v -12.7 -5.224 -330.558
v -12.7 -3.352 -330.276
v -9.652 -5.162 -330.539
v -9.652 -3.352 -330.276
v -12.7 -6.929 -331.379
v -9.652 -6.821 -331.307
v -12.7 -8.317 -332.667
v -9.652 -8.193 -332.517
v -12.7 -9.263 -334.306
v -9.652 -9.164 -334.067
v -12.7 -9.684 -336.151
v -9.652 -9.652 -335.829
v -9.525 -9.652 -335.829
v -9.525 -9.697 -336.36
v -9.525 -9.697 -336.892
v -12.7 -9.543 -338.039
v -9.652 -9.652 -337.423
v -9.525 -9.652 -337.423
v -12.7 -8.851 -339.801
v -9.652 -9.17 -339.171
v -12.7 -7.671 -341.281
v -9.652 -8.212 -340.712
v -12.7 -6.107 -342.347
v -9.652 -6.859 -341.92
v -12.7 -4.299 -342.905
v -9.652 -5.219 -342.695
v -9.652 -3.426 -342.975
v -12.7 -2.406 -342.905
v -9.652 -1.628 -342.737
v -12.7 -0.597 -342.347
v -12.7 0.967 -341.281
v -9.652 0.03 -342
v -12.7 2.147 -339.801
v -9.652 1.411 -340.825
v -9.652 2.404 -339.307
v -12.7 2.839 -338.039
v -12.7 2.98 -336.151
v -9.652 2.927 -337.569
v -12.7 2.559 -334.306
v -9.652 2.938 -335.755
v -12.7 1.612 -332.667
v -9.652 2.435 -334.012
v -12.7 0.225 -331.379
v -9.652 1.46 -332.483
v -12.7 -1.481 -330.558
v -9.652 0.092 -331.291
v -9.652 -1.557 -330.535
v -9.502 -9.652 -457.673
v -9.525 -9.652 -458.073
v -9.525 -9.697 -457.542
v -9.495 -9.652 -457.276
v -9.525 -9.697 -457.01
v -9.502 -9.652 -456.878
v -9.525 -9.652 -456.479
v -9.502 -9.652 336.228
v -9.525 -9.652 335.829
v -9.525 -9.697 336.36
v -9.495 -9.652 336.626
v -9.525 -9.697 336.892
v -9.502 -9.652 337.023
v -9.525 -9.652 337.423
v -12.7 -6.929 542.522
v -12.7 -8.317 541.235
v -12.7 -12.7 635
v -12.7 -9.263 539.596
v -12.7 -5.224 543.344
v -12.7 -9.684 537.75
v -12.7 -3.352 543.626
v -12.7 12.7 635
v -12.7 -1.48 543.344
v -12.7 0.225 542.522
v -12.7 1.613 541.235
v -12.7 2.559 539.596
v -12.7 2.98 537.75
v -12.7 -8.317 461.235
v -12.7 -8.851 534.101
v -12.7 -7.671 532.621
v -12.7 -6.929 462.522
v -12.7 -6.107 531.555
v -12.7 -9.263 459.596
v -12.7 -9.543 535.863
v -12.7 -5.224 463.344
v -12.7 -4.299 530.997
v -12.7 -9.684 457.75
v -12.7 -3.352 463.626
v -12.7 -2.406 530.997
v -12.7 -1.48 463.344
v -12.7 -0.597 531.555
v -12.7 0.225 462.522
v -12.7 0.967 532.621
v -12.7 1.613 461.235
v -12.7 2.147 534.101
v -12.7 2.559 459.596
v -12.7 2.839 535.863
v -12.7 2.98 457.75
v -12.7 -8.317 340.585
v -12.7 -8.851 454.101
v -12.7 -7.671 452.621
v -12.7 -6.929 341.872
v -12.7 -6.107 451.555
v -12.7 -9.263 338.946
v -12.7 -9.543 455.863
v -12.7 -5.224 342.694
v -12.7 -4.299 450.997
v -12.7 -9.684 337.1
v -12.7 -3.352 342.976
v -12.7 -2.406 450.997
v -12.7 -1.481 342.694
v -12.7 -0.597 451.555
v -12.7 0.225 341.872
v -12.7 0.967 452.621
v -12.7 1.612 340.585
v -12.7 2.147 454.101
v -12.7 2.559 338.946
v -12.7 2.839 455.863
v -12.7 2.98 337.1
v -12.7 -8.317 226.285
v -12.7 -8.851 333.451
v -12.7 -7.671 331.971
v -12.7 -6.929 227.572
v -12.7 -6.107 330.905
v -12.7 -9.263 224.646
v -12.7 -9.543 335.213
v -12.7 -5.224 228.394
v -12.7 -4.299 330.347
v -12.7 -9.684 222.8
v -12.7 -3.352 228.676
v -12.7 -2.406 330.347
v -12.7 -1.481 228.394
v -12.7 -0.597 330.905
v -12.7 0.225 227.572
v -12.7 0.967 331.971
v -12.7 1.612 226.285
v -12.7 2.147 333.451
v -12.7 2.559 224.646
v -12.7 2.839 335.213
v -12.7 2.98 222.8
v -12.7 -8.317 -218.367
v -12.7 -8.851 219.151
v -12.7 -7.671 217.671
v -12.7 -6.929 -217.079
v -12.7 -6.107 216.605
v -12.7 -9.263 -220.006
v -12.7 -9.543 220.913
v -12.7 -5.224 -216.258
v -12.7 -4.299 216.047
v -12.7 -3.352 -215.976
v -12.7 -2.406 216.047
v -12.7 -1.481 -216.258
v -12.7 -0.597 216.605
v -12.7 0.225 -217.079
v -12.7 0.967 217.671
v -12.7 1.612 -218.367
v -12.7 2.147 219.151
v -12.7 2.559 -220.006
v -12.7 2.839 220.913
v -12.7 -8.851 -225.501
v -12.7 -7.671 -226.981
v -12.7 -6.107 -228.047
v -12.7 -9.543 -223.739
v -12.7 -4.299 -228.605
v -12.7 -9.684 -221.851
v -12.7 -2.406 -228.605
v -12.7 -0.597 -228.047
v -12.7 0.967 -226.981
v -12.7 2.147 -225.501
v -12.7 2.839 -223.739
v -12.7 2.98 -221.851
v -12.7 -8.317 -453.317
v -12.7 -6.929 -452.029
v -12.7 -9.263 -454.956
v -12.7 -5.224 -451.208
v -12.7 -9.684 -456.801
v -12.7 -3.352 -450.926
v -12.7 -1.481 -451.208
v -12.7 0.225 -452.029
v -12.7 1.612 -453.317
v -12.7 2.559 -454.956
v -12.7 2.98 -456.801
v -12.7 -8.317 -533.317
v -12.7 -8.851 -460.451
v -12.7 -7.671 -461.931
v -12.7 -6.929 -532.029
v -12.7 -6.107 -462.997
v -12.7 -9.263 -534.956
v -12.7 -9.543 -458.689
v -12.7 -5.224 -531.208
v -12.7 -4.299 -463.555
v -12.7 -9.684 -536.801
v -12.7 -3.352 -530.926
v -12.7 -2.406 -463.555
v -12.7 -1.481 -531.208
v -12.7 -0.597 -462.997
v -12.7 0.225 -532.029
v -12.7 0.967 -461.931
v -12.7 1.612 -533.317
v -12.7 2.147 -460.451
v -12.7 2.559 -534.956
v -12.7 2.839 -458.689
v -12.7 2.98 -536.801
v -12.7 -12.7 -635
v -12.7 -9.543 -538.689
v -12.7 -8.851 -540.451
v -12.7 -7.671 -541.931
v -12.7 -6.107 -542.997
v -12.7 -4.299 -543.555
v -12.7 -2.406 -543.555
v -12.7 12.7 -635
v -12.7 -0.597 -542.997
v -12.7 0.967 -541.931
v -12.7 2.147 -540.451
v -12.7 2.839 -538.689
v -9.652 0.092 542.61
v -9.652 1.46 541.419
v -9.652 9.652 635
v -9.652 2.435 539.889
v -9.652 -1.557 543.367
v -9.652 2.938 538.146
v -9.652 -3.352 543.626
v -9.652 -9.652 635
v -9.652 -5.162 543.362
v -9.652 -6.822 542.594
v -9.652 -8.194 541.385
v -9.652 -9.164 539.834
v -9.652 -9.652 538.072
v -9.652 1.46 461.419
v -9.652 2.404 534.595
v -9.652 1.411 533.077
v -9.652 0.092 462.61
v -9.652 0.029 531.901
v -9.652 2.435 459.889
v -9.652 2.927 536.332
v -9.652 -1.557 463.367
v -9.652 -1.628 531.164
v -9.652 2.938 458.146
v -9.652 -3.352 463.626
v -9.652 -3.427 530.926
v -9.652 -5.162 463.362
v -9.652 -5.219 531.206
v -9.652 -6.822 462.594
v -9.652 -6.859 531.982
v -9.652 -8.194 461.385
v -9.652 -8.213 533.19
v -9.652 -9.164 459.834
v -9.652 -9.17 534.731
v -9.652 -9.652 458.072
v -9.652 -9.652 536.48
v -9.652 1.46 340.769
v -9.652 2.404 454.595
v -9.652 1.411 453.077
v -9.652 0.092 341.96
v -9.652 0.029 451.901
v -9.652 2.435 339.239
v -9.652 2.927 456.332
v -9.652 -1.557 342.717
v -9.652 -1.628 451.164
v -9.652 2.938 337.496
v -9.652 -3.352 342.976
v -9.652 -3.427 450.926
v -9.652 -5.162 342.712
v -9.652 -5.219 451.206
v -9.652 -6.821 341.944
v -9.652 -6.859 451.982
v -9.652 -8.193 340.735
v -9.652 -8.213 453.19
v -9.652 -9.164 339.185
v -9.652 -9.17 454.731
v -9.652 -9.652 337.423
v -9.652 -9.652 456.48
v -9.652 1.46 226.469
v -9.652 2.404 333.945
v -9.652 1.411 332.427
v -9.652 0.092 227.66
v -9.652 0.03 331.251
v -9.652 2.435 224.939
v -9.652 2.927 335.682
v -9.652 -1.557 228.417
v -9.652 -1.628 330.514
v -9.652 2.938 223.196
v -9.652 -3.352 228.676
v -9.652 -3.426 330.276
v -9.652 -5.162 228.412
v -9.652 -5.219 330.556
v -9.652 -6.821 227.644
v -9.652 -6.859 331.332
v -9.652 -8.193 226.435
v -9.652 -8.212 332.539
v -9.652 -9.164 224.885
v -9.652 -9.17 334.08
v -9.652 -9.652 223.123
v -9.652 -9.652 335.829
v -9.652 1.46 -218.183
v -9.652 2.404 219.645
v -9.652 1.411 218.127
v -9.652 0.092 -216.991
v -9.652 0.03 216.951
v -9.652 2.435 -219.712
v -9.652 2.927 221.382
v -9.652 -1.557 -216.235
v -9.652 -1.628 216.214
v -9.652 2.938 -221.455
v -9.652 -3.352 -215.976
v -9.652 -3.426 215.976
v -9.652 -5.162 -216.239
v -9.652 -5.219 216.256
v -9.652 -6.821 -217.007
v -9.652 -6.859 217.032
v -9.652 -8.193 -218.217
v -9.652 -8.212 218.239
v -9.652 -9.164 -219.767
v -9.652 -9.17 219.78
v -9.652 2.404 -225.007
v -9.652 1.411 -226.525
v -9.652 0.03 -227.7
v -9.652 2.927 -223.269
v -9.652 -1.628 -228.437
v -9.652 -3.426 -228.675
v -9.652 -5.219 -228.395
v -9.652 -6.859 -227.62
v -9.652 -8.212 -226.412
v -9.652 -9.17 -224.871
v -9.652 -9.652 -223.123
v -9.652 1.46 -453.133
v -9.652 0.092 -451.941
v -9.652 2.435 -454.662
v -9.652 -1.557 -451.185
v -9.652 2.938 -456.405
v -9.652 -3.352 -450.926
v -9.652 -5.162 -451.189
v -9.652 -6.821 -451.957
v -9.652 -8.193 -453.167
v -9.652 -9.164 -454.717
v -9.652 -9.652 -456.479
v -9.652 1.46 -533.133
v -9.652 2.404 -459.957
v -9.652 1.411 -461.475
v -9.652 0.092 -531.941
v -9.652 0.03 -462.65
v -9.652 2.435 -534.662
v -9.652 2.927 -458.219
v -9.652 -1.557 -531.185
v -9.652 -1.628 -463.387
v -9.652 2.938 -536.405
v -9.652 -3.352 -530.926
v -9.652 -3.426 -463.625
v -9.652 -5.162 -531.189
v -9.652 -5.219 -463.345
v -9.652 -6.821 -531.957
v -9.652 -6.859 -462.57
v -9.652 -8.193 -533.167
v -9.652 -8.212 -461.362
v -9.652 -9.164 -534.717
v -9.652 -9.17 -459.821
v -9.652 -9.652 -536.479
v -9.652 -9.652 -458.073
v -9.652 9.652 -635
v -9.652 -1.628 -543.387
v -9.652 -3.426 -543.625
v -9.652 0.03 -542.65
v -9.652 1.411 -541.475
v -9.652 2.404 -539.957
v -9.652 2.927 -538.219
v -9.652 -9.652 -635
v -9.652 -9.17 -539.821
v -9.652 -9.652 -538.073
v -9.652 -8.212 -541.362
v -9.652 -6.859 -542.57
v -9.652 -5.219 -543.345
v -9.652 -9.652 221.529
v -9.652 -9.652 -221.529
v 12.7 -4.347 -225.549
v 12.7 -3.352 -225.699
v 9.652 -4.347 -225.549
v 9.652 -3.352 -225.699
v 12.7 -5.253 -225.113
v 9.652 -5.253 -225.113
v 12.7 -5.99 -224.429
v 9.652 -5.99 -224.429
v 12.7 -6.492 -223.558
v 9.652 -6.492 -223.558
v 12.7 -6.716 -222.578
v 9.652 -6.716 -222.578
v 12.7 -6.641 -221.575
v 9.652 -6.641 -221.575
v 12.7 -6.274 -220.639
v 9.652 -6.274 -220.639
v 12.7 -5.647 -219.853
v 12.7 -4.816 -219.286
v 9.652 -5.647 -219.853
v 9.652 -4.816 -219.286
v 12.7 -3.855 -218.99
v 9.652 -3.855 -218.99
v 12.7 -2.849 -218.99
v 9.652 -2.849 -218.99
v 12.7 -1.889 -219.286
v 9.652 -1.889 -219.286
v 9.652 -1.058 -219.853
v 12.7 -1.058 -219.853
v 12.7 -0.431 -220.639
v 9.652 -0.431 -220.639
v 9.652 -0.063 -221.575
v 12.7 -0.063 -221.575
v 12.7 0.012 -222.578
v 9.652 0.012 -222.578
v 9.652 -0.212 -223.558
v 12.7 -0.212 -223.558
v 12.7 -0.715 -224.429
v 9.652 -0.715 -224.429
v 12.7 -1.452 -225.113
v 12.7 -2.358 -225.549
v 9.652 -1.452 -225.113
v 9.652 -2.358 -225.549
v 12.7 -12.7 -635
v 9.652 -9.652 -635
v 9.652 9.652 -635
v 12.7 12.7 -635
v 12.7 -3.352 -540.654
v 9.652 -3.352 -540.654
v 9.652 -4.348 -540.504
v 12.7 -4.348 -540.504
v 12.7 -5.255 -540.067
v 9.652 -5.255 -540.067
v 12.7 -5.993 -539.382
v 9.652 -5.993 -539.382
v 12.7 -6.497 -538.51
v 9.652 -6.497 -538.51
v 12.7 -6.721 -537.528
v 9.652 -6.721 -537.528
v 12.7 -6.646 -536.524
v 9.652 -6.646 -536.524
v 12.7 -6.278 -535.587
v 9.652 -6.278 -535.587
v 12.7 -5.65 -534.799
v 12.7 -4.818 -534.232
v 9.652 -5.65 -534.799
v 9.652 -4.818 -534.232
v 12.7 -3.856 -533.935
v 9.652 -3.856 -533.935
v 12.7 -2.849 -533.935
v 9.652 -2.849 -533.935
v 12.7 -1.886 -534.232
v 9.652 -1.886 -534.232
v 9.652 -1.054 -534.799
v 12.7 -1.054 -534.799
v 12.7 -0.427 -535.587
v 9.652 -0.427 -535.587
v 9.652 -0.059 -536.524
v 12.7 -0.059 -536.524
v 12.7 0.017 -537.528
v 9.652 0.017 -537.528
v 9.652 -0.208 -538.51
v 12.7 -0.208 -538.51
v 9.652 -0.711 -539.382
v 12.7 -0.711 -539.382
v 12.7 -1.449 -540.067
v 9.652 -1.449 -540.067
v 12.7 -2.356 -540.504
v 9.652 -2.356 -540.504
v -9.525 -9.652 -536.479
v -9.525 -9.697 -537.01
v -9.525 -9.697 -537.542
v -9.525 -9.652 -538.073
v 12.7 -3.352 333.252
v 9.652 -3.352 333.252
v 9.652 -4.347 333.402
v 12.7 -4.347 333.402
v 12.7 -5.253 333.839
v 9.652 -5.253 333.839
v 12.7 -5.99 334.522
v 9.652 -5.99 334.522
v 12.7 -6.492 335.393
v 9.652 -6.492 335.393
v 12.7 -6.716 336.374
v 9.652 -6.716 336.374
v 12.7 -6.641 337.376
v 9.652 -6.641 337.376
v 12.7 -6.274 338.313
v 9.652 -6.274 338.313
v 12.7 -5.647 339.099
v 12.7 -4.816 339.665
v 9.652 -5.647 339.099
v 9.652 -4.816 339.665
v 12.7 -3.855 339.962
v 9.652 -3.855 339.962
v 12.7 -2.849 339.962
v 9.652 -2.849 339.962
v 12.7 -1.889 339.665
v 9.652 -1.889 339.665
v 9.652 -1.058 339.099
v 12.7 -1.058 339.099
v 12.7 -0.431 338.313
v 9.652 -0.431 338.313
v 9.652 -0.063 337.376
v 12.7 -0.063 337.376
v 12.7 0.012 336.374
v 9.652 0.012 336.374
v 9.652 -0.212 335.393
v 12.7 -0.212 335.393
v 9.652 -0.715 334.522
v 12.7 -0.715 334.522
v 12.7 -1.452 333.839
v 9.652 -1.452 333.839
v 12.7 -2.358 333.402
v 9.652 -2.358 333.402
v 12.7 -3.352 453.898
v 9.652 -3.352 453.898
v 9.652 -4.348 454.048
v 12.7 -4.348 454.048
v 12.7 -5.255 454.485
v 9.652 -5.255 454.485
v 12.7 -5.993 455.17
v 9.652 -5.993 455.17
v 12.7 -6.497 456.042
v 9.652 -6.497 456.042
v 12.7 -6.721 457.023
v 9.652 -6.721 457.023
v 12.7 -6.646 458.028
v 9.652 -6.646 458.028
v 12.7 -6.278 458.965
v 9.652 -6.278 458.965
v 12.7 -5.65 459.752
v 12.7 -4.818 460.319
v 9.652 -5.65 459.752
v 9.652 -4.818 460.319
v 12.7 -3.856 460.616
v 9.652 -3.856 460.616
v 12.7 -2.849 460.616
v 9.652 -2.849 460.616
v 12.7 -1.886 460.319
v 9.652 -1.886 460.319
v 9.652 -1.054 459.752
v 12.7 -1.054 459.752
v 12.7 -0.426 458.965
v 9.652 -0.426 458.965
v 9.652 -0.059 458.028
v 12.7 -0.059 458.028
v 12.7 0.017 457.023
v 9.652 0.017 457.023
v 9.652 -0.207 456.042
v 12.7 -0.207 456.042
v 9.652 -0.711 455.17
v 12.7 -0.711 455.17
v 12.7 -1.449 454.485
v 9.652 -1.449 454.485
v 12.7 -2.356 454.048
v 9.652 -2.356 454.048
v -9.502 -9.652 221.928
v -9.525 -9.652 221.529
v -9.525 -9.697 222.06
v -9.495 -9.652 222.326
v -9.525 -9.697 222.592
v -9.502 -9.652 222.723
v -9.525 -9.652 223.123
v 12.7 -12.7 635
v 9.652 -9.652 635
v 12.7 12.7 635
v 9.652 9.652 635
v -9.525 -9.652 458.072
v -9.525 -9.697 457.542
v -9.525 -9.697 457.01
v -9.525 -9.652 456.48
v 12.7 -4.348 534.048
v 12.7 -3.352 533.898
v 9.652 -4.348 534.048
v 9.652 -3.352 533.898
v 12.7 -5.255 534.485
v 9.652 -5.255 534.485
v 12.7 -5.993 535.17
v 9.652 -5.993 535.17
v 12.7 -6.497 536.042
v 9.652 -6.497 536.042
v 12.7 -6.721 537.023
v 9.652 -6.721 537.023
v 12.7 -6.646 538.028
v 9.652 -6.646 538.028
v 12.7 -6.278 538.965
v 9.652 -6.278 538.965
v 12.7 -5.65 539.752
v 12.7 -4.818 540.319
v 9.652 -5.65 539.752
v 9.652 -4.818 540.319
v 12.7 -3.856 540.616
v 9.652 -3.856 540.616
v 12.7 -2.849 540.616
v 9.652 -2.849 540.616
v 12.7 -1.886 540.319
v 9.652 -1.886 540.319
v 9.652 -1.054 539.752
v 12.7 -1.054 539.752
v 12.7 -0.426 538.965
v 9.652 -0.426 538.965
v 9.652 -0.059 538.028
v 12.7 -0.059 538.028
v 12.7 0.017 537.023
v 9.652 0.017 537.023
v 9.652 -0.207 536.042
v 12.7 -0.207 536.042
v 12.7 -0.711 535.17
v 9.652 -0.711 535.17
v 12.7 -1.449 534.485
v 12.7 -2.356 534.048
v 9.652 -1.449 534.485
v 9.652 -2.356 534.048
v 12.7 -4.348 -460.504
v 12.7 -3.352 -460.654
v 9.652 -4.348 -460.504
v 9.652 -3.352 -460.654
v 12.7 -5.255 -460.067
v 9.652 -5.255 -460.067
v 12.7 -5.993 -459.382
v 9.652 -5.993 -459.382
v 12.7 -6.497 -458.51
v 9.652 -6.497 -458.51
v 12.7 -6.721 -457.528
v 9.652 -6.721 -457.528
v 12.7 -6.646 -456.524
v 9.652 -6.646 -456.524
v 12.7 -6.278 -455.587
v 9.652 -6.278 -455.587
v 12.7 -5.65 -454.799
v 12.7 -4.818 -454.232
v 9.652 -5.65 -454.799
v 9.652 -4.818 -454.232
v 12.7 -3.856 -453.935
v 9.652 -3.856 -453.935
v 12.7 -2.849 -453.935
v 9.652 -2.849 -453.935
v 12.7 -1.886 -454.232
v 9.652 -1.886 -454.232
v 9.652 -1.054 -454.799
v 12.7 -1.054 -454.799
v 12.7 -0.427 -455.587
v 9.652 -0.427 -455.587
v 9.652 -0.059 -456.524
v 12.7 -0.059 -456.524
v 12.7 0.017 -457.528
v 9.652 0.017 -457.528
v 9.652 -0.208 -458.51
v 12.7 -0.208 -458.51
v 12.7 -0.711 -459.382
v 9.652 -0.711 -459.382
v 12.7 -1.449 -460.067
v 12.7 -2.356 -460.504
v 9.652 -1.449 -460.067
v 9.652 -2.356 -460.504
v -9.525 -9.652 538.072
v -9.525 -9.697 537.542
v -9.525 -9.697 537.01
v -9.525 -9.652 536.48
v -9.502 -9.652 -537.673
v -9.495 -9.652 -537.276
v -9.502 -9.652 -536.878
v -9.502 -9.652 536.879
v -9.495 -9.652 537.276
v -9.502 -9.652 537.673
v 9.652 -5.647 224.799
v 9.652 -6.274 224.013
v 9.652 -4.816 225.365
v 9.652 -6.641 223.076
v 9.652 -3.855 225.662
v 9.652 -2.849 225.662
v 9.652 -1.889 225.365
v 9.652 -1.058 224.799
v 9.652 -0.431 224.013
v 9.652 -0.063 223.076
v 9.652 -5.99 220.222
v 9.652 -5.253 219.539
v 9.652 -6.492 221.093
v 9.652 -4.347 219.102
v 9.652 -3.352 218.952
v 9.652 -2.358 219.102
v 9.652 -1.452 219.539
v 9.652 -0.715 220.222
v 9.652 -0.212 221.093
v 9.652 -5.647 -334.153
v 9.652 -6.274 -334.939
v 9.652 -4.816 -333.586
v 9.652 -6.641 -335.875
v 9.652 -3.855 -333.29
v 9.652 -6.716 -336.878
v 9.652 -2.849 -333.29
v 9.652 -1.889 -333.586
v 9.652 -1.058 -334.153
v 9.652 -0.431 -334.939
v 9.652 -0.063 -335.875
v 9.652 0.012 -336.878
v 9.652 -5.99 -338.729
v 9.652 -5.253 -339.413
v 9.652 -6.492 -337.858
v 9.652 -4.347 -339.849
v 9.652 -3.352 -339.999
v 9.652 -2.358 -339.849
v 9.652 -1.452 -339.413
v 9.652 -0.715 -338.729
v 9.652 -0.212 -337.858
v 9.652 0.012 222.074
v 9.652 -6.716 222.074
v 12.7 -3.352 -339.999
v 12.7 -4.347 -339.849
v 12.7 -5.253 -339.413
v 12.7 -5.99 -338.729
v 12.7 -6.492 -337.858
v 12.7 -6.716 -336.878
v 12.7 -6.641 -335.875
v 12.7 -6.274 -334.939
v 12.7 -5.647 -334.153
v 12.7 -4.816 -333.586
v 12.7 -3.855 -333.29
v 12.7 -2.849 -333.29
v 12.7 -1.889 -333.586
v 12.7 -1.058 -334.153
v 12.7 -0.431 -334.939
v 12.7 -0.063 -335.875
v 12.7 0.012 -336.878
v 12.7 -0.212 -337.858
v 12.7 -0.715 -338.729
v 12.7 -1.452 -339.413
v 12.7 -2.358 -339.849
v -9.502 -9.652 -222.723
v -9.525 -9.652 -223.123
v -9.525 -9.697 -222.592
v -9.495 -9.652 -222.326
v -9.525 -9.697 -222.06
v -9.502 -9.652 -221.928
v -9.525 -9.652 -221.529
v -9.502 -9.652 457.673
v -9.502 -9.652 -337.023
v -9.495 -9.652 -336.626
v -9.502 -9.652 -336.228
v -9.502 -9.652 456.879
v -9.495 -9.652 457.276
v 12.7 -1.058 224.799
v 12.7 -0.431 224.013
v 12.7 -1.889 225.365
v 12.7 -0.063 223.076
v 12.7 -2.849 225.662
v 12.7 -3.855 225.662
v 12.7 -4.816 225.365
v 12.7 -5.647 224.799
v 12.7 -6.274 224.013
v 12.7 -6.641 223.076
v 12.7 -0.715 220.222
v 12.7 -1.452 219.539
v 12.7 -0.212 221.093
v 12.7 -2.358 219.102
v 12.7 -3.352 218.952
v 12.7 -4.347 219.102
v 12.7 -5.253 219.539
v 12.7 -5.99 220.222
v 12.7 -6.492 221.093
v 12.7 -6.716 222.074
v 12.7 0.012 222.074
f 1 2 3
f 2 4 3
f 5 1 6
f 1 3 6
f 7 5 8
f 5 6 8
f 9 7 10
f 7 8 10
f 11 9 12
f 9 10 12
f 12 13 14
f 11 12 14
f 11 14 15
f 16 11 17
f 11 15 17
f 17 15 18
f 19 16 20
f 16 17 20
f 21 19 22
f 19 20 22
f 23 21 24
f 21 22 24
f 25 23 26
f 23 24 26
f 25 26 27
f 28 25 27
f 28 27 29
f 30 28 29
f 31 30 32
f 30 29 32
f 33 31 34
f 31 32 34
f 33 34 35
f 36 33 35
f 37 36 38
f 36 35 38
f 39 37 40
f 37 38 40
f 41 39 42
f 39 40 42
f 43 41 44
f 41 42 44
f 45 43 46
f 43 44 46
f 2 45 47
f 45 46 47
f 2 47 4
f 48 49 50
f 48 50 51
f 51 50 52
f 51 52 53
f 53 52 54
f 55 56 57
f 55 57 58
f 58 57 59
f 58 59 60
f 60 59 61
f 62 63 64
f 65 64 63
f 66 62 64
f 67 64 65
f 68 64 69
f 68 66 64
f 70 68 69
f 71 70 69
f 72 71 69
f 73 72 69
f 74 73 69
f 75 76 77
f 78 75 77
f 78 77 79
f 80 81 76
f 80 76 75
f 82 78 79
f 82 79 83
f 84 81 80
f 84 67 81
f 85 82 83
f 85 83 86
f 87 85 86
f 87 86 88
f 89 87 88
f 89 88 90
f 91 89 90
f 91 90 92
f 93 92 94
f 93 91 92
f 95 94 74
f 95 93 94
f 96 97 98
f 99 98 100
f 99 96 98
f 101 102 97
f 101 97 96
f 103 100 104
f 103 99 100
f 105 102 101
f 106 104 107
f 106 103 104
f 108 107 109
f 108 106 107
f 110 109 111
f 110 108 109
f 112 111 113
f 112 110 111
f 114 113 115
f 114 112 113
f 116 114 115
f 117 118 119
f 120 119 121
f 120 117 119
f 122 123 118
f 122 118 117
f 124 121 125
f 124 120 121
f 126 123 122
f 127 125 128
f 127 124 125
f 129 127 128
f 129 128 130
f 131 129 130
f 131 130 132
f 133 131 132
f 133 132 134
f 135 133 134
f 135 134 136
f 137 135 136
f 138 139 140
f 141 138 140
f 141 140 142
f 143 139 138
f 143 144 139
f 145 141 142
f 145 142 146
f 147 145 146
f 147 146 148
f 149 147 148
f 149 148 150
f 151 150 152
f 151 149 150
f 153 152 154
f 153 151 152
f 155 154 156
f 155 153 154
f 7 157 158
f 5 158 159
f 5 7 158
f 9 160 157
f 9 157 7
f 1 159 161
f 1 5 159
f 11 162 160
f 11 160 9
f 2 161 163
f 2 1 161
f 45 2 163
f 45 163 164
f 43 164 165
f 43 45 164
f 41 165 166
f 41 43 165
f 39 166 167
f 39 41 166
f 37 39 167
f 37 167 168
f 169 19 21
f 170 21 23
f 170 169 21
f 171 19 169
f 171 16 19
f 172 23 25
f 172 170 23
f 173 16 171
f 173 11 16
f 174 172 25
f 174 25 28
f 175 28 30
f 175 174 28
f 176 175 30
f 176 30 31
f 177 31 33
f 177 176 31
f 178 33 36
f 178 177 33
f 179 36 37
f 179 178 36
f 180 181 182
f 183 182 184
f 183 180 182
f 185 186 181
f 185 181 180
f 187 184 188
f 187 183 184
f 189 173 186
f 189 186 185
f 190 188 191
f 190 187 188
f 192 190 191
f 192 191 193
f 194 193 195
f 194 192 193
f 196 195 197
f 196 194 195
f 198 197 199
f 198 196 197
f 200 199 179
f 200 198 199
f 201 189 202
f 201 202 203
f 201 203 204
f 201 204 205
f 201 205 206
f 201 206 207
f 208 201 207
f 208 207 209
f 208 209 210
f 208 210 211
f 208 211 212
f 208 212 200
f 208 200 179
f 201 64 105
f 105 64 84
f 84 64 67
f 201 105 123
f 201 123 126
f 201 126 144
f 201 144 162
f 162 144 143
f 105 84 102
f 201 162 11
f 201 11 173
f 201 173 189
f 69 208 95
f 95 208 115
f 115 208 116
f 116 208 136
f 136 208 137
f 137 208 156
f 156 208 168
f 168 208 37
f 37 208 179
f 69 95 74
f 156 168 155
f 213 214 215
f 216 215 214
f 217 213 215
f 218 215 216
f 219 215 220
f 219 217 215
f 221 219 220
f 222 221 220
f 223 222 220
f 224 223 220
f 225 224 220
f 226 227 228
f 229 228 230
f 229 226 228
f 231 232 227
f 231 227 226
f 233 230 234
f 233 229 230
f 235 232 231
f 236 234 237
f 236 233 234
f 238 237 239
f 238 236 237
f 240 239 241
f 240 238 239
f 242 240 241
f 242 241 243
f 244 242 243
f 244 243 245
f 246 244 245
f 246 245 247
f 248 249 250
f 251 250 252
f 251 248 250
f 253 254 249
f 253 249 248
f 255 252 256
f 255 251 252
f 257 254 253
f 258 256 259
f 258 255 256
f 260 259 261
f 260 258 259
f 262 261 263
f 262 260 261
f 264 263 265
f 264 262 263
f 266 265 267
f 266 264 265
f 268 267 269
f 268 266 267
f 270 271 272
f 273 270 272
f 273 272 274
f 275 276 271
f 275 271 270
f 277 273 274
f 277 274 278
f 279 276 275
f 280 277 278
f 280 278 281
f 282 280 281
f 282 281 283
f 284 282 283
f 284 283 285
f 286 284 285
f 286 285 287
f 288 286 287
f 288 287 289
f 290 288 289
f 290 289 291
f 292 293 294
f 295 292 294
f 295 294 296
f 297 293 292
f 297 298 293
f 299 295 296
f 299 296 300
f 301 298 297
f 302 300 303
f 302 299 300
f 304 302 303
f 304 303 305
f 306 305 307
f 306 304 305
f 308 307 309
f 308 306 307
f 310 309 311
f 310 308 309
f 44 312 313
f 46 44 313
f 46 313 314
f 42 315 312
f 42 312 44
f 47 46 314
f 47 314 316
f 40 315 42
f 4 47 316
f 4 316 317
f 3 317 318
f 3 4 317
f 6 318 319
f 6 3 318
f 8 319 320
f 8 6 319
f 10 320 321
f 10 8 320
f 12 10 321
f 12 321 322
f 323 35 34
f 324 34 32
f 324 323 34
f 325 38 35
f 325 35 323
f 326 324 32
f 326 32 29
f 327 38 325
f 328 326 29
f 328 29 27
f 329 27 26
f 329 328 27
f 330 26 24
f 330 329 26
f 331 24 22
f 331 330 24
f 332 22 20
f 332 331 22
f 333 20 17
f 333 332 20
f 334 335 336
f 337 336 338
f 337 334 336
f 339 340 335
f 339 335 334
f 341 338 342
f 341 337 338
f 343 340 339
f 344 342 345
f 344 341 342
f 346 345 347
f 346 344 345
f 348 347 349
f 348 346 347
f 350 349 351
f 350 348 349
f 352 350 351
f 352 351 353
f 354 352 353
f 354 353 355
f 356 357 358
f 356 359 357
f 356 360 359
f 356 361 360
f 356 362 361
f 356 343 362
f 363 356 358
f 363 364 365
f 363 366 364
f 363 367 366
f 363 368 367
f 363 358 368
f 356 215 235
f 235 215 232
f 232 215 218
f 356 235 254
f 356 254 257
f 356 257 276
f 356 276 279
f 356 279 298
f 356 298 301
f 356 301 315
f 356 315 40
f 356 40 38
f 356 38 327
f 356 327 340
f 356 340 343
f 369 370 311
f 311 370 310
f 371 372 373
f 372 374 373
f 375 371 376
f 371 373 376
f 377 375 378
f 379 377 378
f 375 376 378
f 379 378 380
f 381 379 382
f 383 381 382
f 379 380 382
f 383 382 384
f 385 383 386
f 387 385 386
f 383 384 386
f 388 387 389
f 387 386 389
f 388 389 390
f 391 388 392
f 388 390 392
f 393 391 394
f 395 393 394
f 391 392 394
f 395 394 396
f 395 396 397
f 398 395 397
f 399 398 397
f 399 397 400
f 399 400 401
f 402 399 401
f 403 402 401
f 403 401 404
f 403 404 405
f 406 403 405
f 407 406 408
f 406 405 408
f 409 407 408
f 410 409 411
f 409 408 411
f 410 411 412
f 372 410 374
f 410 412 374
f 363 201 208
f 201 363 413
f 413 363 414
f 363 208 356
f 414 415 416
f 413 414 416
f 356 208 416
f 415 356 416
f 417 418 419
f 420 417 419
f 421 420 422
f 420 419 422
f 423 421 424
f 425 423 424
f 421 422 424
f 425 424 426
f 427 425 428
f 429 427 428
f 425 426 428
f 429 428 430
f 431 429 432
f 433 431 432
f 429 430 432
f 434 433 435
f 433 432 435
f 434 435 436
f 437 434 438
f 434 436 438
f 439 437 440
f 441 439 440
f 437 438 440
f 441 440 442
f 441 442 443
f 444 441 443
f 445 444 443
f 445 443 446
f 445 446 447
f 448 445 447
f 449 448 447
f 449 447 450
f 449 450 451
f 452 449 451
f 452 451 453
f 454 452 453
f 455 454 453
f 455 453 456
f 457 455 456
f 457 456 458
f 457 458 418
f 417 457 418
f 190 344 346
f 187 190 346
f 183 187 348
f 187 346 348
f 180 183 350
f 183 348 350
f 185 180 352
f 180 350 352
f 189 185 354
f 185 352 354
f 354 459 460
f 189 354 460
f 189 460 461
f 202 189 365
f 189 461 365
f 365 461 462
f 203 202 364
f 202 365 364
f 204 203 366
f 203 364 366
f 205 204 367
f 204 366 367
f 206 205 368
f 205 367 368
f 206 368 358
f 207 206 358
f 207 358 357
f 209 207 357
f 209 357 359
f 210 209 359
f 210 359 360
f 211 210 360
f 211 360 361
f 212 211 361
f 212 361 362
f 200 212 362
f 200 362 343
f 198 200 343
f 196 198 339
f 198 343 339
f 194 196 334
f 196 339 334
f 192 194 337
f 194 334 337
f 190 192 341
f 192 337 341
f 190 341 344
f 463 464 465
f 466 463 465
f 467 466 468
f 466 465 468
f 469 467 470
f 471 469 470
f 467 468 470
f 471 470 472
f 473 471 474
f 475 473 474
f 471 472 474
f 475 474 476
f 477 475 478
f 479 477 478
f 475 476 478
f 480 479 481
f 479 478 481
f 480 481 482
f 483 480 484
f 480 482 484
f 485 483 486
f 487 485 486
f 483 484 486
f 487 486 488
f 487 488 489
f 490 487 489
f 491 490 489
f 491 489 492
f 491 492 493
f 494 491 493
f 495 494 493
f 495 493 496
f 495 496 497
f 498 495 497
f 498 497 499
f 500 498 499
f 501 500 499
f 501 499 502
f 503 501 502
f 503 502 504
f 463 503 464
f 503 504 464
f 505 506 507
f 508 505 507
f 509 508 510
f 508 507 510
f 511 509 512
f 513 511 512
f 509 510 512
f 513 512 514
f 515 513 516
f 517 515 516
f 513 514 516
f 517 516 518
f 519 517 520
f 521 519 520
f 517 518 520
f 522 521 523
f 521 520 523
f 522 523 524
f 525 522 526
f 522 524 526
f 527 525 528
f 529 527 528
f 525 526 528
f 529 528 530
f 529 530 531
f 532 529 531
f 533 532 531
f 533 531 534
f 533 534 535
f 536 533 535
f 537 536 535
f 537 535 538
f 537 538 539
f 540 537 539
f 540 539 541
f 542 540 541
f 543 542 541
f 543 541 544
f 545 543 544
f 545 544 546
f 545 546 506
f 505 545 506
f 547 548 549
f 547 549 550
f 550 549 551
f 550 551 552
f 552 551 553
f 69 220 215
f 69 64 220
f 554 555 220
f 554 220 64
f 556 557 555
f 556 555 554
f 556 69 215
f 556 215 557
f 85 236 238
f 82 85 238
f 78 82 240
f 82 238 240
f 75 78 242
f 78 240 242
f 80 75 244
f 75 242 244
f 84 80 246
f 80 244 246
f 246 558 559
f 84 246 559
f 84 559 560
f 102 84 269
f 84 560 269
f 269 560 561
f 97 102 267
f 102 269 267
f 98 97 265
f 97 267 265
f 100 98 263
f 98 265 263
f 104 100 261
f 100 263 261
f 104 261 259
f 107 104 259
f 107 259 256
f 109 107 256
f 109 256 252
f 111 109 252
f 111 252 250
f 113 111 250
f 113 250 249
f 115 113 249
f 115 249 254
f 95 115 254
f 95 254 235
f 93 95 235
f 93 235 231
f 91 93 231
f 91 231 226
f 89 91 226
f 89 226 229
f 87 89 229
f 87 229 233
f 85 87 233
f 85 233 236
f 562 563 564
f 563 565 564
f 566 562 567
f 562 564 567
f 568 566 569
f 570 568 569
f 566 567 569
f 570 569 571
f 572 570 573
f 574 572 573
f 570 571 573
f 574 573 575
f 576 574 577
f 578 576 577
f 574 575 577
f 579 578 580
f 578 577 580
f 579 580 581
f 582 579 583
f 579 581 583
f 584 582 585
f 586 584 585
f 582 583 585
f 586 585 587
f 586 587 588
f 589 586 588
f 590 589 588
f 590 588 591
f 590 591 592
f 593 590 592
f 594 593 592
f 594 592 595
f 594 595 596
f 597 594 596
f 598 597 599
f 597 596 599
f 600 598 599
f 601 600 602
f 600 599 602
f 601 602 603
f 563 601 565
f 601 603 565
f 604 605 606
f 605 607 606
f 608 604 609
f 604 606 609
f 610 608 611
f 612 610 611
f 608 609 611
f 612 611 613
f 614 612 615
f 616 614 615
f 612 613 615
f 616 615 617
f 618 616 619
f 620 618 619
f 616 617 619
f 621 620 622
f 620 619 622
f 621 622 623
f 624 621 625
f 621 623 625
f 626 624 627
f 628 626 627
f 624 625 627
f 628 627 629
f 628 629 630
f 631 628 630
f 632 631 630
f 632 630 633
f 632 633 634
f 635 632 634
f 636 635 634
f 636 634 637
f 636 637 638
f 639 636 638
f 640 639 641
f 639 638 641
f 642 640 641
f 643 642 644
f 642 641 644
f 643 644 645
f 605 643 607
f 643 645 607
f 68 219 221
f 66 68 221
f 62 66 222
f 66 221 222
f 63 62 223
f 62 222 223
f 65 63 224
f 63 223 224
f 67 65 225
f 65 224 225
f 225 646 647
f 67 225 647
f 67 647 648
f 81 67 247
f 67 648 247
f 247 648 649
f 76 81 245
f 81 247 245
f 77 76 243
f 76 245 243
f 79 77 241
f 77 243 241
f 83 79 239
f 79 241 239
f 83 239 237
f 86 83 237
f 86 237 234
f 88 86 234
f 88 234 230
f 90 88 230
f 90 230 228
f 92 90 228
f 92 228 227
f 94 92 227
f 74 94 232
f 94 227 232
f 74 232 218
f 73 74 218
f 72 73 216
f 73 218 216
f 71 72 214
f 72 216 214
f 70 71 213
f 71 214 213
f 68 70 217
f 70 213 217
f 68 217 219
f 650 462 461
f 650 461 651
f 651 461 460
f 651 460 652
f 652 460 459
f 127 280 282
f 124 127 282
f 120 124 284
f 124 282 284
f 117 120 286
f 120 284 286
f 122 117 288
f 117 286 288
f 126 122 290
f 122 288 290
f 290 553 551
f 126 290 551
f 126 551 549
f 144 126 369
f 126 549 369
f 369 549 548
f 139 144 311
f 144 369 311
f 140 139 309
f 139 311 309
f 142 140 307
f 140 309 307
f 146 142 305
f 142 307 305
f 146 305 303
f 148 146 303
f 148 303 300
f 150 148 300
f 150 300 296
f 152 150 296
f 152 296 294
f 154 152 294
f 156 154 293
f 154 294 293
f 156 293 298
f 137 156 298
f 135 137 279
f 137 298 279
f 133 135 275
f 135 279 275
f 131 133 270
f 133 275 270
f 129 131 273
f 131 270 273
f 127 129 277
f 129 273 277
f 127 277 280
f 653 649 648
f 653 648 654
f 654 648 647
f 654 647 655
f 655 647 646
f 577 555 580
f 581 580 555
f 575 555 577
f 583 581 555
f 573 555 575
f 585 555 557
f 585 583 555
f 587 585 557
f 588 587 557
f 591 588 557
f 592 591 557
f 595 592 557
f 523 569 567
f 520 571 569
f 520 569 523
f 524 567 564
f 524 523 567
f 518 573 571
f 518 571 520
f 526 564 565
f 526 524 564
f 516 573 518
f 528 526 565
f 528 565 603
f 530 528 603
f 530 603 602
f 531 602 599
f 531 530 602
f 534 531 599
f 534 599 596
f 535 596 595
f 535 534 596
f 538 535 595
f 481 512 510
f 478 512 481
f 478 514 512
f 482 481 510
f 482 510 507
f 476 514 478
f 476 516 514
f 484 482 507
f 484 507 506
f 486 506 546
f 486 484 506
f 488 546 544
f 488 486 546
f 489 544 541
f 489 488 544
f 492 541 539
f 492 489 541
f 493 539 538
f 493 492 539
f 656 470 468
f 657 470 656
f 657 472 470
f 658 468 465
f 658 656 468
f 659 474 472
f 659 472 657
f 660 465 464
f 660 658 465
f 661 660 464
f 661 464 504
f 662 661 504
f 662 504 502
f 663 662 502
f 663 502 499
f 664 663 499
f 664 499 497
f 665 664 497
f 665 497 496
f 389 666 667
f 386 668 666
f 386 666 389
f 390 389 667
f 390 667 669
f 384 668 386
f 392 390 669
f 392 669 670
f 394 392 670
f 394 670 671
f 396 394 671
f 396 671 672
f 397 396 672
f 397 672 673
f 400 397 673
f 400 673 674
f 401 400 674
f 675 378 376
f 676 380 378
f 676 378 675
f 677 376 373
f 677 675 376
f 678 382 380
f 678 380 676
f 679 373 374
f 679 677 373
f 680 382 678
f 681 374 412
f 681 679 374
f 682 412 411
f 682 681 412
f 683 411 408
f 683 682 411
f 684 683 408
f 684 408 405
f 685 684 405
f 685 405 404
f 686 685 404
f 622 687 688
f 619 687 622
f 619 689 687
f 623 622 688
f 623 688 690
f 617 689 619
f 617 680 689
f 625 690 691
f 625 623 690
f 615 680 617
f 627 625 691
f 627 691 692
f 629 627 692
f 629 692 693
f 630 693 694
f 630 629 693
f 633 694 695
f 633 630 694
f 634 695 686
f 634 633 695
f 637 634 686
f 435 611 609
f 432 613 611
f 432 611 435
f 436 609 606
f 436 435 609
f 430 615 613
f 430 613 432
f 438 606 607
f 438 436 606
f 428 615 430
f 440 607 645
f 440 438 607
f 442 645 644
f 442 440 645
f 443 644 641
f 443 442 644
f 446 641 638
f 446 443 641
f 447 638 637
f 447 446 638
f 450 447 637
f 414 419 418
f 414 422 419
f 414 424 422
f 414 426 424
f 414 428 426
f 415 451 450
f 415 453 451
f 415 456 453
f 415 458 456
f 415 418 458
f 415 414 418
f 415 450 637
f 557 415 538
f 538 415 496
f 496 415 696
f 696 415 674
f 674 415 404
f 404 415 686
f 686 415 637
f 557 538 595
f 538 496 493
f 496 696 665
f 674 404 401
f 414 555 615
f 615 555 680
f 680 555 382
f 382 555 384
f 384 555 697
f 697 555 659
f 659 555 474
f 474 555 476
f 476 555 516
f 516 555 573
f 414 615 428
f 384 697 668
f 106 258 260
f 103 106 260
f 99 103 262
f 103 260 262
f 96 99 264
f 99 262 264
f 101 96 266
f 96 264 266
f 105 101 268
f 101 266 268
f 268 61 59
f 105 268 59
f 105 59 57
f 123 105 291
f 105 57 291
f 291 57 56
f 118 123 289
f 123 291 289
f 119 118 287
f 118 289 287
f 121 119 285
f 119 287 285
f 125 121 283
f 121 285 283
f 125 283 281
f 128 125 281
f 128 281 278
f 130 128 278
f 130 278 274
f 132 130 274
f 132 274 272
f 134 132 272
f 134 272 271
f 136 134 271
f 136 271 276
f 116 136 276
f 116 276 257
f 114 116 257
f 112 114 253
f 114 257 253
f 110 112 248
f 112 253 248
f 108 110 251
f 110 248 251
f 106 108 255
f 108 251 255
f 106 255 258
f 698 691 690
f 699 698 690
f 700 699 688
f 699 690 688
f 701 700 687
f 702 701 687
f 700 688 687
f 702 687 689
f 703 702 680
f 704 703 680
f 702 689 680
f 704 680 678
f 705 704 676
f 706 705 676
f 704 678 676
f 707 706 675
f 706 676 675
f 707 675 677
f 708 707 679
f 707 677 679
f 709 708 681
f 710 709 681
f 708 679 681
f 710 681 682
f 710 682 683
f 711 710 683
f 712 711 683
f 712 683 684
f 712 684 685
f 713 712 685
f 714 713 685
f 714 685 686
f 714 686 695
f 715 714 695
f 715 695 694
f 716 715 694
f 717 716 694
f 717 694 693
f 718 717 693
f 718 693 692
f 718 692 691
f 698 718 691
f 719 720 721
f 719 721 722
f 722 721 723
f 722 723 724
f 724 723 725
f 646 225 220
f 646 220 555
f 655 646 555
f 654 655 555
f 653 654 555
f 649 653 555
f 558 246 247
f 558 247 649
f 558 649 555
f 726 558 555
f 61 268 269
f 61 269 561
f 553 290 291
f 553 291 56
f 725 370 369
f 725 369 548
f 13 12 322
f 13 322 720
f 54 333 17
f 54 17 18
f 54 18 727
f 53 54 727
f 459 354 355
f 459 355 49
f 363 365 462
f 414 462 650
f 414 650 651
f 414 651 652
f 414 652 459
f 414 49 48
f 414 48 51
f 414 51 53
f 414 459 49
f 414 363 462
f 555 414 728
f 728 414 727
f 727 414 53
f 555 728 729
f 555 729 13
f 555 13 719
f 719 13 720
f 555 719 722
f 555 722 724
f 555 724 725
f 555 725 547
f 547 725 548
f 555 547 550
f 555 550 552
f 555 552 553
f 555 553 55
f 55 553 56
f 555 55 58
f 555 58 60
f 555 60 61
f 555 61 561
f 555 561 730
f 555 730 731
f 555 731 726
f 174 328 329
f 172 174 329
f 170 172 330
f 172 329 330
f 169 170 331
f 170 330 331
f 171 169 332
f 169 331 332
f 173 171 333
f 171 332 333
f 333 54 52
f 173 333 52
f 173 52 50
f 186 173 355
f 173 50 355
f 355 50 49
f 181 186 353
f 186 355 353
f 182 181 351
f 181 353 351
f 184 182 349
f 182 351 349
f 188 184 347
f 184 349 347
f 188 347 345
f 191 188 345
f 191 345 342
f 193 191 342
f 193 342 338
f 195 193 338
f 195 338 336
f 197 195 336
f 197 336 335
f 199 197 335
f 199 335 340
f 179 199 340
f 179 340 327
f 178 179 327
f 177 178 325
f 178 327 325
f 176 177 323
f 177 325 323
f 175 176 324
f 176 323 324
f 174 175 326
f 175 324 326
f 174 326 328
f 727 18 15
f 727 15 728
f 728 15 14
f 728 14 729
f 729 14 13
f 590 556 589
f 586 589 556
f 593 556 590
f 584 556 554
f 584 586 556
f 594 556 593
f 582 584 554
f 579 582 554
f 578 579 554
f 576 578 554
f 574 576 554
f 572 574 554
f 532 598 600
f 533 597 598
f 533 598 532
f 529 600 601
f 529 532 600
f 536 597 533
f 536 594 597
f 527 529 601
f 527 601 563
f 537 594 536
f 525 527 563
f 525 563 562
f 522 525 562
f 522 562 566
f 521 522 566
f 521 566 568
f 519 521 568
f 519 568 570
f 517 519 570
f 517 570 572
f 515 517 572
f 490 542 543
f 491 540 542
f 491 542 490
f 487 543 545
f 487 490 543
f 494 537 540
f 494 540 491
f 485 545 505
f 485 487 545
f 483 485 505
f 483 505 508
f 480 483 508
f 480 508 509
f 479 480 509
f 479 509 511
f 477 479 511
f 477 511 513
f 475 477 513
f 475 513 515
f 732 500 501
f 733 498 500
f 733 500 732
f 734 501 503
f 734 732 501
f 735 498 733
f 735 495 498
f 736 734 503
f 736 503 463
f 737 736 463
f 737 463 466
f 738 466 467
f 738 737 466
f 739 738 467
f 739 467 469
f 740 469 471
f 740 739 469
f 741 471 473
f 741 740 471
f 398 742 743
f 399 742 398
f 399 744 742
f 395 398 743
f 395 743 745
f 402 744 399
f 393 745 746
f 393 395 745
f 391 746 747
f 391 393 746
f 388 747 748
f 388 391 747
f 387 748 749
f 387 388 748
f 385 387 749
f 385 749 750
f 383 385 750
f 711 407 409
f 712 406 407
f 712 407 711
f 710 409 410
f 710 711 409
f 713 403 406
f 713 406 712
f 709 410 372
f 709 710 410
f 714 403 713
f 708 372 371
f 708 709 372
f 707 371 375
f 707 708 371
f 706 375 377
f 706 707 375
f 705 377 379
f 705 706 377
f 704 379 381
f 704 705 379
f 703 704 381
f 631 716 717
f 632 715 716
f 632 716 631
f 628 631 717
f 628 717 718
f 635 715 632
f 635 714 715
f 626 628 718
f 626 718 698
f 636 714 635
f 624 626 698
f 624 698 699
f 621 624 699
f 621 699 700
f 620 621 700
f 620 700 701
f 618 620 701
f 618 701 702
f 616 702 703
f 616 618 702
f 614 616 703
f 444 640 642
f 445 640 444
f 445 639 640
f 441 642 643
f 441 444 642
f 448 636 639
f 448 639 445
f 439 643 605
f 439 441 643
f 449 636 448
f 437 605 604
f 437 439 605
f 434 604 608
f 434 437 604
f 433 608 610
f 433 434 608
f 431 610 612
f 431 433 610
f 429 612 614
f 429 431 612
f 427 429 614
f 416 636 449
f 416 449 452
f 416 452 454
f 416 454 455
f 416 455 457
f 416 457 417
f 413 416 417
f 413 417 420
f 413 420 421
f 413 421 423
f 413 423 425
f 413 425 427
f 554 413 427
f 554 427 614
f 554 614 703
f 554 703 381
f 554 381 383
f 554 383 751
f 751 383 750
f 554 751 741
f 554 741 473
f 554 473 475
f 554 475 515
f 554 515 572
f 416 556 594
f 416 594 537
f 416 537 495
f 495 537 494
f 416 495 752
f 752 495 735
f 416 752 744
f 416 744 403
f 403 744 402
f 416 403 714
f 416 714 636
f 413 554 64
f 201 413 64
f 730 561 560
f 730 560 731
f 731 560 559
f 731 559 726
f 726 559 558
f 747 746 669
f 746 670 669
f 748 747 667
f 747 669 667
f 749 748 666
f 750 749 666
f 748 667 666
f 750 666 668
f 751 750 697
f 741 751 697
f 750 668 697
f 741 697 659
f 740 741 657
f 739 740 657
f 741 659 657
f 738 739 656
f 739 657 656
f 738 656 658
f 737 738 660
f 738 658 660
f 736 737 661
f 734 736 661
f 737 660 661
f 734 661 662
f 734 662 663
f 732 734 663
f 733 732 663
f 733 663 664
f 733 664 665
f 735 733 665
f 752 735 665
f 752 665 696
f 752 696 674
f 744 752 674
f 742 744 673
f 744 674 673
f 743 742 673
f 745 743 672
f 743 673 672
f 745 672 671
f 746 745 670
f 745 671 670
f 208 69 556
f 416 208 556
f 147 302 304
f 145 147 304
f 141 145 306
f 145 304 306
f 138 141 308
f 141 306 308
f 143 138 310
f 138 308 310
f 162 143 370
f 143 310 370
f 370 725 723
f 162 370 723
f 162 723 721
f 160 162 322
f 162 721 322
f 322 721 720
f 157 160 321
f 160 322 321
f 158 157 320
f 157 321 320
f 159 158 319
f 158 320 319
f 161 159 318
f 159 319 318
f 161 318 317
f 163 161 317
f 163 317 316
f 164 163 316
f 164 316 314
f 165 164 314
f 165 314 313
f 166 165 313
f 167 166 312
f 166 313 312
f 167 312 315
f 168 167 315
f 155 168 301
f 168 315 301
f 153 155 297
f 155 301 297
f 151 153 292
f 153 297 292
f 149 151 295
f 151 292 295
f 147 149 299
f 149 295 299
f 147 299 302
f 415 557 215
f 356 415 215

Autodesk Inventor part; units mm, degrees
ref_plane "YZ Plane" through (0, 0, 0) normal (1, 0, 0) x (0, 1, 0)
ref_plane "XZ Plane" through (0, 0, 0) normal (0, 1, 0) x (-1, 0, 0)
ref_plane "XY Plane" through (0, 0, 0) normal (0, 0, 1) x (1, 0, 0)
sketch "Sketch1" plane through (0, 0, 0) normal (0, 0, 1) x (1, 0, 0)
  line L0 (-12.7, 12.7) -> (12.7, 12.7)
  line L1 (12.7, 12.7) -> (12.7, -12.7)
  line L2 (12.7, -12.7) -> (-12.7, -12.7)
  line L3 (-12.7, -12.7) -> (-12.7, 12.7)
  line L4 (9.652, 9.652) -> (-9.652, 9.652)
  line L5 (-9.652, 9.652) -> (-9.652, -9.652)
  line L6 (-9.652, -9.652) -> (9.652, -9.652)
  line L7 (9.652, -9.652) -> (9.652, 9.652)
  point P0 (0, 0)
  point P1 (0, 12.7)
  point P2 (12.7, 0)
  point P3 (-12.7, 0)
  dimension "d0" = 25.4
  dimension "d1" = 25.4
  dimension "d2" = 3.048
extrude "Extrusion1" add sketch "Sketch1" along normal mid plane 1270
sketch "Sketch2" plane through (12.7, 12.7, 635) normal (1, 0, 0) x (0, 0, -1)
  circle A0 centre (97.7242, -16.0521) radius 4.25 projected
  circle A1 centre (177.7242, -16.0521) radius 4.25 projected
  circle A2 centre (1092.2758, -16.0522) radius 4.25 projected
  circle A3 centre (1172.2758, -16.0522) radius 4.25 projected
  point P0 (635, -12.7)
hole "Hole1" at (12.7, -3.3521, 537.2758) at (12.7, -3.3521, 457.2758) at (12.7, -3.3522, -457.2758) at (12.7, -3.3522, -537.2758) direction (-1, 0, 0) diameter 6.7564 depth 12.7 tip angle 118
sketch "Sketch3" plane through (-12.7, -12.7, -635) normal (-1, 0, 0) x (0, 0, 1)
  point P0 (635, 12.7)
sketch "Sketch5" plane through (-12.7, -12.7, -635) normal (-1, 0, 0) x (0, 0, 1)
  circle A0 centre (1172.2758, 9.3479) radius 3.3782 projected
  circle A1 centre (1092.2758, 9.3479) radius 3.3782 projected
  circle A2 centre (1092.2758, 9.3479) radius 3.3782 projected
  circle A3 centre (177.7242, 9.3478) radius 3.3782 projected
  circle A4 centre (97.7242, 9.3478) radius 3.3782 projected
  point P0 (635, 12.7)
hole "Hole2" at (-12.7, -3.3521, 537.2758) at (-12.7, -3.3521, 457.2758) at (-12.7, -3.3522, -457.2758) at (-12.7, -3.3522, -537.2758) direction (1, 0, 0) diameter 12.7 depth 3.175 tip angle 118
sketch "Sketch6" plane through (12.7, 12.7, 635) normal (1, 0, 0) x (0, 0, -1)
  circle A0 centre (1092.2758, -16.0522) radius 3.3782 projected
  circle A1 centre (177.7242, -16.0521) radius 3.3782 projected
  point P0 (635, -12.7)
  point P1 (298.3742, -16.0522)
  point P2 (412.6742, -16.0522)
  point P3 (857.3258, -16.0522)
  point P4 (971.6258, -16.0522)
  dimension "d19" = 120.65
  dimension "d20" = 114.3
  dimension "d21" = 120.65
  dimension "d22" = 114.3
hole "Hole3" at (12.7, -3.3522, 336.6258) at (12.7, -3.3522, 222.3258) at (12.7, -3.3522, -222.3258) at (12.7, -3.3522, -336.6258) direction (-1, 0, 0) diameter 6.7469 depth 3.175 tip angle 118
sketch "Sketch7" plane through (-12.7, -12.7, -635) normal (-1, 0, 0) x (0, 0, 1)
  circle A0 centre (971.6258, 9.3478) radius 3.3734 projected
  circle A1 centre (857.3258, 9.3478) radius 3.3734 projected
  circle A2 centre (412.6742, 9.3478) radius 3.3734 projected
  circle A3 centre (298.3742, 9.3478) radius 3.3734 projected
  circle A4 centre (971.6258, 9.3478) radius 3.3734 projected
  line L0 (444.5, -28.493) -> (444.5, 123.907) projected
  line L1 (266.7, -34.843) -> (444.5, -34.843) projected
  line L2 (266.7, -34.843) -> (444.5, -34.843) projected
  line L3 (444.5, 130.257) -> (266.7, 130.257) projected
  point P0 (635, 12.7)
hole "Hole4" at (-12.7, -3.3522, 336.6258) at (-12.7, -3.3522, 222.3258) at (-12.7, -3.3522, -222.3258) at (-12.7, -3.3522, -336.6258) direction (1, 0, 0) diameter 12.7 depth 3.175 tip angle 118
equation "\"d2\" = thick"
equation "\"d3\" = L"
equation "\"L\" = 1270"
equation "\"thick\" = 3.048"
properties part number "1inSquareSupport2"
